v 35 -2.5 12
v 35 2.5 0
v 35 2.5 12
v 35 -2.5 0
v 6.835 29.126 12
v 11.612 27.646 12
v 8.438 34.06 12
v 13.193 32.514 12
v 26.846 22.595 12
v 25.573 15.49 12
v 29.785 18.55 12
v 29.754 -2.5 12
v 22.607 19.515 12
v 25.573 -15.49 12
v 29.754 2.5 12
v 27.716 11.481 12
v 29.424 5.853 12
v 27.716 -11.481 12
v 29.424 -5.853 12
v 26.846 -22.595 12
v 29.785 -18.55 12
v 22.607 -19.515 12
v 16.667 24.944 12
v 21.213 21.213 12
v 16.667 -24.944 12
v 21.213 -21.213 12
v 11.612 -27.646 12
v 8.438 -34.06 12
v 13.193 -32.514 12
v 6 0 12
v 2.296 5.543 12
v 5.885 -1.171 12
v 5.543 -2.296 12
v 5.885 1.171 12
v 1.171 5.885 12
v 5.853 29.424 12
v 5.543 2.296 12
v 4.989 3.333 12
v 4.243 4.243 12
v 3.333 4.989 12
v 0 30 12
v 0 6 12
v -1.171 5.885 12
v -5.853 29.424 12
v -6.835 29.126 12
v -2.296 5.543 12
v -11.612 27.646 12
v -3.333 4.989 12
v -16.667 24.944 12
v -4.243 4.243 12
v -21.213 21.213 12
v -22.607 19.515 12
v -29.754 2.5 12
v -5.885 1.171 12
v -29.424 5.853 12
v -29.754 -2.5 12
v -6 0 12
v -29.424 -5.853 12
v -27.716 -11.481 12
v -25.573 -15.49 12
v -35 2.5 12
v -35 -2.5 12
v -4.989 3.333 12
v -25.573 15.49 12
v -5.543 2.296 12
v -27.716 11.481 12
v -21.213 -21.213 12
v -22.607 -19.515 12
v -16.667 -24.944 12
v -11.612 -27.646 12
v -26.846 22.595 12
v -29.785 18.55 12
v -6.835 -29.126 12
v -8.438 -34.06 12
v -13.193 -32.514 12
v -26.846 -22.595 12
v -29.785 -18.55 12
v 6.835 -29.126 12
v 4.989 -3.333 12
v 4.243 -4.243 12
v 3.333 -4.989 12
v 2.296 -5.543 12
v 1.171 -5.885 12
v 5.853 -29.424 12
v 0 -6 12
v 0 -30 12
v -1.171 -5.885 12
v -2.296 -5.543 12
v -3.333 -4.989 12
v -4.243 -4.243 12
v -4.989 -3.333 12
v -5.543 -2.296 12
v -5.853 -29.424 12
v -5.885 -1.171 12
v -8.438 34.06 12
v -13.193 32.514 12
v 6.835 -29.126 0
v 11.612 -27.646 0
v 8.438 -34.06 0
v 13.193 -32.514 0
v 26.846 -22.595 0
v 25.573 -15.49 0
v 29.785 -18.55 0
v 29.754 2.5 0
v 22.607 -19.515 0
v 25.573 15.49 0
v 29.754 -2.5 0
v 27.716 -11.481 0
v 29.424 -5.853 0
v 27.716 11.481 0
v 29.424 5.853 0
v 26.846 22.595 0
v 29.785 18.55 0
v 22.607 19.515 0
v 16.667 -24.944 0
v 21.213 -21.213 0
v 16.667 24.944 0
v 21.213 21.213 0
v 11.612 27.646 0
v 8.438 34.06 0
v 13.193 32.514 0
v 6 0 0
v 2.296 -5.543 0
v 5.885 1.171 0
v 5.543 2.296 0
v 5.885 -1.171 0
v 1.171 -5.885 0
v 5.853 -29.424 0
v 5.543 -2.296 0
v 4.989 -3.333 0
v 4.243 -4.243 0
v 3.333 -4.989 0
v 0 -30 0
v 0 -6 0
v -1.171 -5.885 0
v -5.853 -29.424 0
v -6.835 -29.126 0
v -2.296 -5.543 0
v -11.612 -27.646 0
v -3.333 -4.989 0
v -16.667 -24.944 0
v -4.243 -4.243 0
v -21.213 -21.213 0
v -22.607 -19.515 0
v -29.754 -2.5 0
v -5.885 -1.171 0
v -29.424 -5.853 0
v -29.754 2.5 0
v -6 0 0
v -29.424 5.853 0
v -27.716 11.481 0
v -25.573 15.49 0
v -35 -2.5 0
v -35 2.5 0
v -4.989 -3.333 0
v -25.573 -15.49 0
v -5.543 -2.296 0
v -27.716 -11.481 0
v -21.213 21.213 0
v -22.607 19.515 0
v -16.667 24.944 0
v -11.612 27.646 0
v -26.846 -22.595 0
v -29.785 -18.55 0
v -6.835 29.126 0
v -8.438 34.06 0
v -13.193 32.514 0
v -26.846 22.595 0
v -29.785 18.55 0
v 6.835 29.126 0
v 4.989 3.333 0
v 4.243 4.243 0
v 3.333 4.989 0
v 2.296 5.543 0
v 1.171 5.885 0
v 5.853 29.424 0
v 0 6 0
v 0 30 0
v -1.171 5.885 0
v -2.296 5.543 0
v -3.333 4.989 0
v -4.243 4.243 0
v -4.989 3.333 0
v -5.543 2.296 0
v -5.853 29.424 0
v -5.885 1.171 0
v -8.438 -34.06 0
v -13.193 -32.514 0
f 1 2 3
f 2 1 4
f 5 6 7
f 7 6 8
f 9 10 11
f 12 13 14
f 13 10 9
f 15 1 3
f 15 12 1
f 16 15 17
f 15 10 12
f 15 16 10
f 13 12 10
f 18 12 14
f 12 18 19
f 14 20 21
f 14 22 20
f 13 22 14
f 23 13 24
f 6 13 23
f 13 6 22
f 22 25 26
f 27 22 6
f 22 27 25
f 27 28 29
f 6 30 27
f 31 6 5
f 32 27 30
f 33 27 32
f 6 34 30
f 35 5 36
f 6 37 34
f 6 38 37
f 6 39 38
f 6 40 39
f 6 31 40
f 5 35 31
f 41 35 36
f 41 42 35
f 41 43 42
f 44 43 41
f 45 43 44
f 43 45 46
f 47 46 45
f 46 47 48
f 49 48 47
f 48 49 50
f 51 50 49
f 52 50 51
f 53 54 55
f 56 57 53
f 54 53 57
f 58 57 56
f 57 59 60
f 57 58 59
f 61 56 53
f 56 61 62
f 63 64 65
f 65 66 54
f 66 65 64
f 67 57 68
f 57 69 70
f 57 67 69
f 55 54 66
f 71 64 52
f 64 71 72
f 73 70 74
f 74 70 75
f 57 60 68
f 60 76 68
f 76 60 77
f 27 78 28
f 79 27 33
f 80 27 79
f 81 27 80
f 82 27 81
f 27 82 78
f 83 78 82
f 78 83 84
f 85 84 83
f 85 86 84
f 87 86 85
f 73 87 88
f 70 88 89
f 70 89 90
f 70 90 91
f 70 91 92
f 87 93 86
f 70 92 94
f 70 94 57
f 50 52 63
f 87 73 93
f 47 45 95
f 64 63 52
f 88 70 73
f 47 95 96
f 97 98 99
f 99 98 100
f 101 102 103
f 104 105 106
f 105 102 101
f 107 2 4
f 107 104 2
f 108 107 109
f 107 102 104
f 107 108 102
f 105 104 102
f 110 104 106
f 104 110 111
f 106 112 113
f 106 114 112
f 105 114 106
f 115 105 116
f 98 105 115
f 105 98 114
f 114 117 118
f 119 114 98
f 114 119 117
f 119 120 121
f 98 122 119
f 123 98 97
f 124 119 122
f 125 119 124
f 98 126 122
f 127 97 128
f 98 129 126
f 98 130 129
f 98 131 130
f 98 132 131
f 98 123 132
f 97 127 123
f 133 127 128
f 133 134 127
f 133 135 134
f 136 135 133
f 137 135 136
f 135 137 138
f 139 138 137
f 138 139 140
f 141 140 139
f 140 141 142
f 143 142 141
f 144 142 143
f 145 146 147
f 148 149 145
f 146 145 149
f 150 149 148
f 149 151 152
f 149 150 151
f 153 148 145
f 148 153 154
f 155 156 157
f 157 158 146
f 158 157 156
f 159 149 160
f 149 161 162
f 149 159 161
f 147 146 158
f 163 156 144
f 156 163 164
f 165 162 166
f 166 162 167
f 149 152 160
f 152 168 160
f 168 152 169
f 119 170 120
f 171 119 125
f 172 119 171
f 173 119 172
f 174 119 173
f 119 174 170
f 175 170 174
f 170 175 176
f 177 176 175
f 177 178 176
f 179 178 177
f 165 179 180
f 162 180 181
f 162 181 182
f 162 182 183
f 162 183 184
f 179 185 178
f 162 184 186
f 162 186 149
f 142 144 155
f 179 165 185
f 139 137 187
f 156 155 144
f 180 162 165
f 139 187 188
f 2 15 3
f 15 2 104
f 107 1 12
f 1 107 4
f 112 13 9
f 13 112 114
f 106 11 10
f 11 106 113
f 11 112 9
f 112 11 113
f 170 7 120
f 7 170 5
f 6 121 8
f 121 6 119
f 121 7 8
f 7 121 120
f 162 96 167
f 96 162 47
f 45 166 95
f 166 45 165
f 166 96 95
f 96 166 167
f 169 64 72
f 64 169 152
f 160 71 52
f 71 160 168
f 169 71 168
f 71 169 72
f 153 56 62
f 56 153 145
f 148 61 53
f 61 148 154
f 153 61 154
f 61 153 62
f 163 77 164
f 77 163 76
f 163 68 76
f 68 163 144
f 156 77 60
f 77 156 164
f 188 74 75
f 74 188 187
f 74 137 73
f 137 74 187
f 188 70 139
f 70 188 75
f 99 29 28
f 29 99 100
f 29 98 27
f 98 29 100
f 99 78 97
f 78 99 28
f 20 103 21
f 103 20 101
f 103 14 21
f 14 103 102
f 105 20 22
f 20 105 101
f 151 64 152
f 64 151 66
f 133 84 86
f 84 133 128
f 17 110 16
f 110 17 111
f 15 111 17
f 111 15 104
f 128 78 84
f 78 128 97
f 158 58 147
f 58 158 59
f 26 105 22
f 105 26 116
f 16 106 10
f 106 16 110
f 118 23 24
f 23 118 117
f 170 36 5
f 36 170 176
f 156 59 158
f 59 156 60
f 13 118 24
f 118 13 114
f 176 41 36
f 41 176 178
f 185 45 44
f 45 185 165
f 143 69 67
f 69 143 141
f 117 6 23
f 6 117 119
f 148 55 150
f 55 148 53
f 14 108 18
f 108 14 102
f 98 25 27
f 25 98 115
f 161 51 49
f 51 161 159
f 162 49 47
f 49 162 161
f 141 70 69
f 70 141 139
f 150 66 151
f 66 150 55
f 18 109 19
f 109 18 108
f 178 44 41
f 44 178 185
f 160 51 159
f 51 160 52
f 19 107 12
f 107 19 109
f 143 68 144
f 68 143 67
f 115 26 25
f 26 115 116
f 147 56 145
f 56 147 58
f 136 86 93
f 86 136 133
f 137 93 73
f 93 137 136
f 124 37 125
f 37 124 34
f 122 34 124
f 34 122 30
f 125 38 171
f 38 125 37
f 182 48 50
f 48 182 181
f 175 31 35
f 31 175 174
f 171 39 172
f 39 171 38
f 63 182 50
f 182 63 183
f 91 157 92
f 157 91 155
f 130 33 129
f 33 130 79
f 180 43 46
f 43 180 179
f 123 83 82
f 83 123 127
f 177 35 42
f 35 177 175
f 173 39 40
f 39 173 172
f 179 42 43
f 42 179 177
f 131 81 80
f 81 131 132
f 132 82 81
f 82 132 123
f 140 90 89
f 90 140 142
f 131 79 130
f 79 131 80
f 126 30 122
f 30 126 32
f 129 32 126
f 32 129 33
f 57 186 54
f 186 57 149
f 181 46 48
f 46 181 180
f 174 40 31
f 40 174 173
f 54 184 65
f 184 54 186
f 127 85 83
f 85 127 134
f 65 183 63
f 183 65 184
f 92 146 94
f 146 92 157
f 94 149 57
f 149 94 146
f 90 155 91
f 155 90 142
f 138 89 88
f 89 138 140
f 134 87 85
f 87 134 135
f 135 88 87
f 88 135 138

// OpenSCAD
$fn = 32;

// ----------------------------------------------------------------------
// Spur blank: bored gear blank
// ----------------------------------------------------------------------

// --- parameters (mm) ---
disc_r = 30;              // blank root radius
disc_t = 12;              // blank thickness
n_teeth = 10;             // stub tooth count
tooth_w = 5;              // tooth width at the root
tooth_h = 5;              // tooth height above the root
bore_r = 6;               // central bore radius

out_r = disc_r + tooth_h;  // tip radius
bbox_x = 70.0;  // measured width over the teeth
bbox_y = 68.12;  // measured depth over the teeth

difference() {
union() {
  cylinder(r = disc_r, h = disc_t);
  for (i = [0 : n_teeth - 1])
    rotate([0, 0, i * 360 / n_teeth])
      translate([disc_r - 1, -tooth_w / 2, 0])
        cube([tooth_h + 1, tooth_w, disc_t]);
}
  translate([0, 0, -1]) cylinder(r = bore_r, h = disc_t + 2);
}
